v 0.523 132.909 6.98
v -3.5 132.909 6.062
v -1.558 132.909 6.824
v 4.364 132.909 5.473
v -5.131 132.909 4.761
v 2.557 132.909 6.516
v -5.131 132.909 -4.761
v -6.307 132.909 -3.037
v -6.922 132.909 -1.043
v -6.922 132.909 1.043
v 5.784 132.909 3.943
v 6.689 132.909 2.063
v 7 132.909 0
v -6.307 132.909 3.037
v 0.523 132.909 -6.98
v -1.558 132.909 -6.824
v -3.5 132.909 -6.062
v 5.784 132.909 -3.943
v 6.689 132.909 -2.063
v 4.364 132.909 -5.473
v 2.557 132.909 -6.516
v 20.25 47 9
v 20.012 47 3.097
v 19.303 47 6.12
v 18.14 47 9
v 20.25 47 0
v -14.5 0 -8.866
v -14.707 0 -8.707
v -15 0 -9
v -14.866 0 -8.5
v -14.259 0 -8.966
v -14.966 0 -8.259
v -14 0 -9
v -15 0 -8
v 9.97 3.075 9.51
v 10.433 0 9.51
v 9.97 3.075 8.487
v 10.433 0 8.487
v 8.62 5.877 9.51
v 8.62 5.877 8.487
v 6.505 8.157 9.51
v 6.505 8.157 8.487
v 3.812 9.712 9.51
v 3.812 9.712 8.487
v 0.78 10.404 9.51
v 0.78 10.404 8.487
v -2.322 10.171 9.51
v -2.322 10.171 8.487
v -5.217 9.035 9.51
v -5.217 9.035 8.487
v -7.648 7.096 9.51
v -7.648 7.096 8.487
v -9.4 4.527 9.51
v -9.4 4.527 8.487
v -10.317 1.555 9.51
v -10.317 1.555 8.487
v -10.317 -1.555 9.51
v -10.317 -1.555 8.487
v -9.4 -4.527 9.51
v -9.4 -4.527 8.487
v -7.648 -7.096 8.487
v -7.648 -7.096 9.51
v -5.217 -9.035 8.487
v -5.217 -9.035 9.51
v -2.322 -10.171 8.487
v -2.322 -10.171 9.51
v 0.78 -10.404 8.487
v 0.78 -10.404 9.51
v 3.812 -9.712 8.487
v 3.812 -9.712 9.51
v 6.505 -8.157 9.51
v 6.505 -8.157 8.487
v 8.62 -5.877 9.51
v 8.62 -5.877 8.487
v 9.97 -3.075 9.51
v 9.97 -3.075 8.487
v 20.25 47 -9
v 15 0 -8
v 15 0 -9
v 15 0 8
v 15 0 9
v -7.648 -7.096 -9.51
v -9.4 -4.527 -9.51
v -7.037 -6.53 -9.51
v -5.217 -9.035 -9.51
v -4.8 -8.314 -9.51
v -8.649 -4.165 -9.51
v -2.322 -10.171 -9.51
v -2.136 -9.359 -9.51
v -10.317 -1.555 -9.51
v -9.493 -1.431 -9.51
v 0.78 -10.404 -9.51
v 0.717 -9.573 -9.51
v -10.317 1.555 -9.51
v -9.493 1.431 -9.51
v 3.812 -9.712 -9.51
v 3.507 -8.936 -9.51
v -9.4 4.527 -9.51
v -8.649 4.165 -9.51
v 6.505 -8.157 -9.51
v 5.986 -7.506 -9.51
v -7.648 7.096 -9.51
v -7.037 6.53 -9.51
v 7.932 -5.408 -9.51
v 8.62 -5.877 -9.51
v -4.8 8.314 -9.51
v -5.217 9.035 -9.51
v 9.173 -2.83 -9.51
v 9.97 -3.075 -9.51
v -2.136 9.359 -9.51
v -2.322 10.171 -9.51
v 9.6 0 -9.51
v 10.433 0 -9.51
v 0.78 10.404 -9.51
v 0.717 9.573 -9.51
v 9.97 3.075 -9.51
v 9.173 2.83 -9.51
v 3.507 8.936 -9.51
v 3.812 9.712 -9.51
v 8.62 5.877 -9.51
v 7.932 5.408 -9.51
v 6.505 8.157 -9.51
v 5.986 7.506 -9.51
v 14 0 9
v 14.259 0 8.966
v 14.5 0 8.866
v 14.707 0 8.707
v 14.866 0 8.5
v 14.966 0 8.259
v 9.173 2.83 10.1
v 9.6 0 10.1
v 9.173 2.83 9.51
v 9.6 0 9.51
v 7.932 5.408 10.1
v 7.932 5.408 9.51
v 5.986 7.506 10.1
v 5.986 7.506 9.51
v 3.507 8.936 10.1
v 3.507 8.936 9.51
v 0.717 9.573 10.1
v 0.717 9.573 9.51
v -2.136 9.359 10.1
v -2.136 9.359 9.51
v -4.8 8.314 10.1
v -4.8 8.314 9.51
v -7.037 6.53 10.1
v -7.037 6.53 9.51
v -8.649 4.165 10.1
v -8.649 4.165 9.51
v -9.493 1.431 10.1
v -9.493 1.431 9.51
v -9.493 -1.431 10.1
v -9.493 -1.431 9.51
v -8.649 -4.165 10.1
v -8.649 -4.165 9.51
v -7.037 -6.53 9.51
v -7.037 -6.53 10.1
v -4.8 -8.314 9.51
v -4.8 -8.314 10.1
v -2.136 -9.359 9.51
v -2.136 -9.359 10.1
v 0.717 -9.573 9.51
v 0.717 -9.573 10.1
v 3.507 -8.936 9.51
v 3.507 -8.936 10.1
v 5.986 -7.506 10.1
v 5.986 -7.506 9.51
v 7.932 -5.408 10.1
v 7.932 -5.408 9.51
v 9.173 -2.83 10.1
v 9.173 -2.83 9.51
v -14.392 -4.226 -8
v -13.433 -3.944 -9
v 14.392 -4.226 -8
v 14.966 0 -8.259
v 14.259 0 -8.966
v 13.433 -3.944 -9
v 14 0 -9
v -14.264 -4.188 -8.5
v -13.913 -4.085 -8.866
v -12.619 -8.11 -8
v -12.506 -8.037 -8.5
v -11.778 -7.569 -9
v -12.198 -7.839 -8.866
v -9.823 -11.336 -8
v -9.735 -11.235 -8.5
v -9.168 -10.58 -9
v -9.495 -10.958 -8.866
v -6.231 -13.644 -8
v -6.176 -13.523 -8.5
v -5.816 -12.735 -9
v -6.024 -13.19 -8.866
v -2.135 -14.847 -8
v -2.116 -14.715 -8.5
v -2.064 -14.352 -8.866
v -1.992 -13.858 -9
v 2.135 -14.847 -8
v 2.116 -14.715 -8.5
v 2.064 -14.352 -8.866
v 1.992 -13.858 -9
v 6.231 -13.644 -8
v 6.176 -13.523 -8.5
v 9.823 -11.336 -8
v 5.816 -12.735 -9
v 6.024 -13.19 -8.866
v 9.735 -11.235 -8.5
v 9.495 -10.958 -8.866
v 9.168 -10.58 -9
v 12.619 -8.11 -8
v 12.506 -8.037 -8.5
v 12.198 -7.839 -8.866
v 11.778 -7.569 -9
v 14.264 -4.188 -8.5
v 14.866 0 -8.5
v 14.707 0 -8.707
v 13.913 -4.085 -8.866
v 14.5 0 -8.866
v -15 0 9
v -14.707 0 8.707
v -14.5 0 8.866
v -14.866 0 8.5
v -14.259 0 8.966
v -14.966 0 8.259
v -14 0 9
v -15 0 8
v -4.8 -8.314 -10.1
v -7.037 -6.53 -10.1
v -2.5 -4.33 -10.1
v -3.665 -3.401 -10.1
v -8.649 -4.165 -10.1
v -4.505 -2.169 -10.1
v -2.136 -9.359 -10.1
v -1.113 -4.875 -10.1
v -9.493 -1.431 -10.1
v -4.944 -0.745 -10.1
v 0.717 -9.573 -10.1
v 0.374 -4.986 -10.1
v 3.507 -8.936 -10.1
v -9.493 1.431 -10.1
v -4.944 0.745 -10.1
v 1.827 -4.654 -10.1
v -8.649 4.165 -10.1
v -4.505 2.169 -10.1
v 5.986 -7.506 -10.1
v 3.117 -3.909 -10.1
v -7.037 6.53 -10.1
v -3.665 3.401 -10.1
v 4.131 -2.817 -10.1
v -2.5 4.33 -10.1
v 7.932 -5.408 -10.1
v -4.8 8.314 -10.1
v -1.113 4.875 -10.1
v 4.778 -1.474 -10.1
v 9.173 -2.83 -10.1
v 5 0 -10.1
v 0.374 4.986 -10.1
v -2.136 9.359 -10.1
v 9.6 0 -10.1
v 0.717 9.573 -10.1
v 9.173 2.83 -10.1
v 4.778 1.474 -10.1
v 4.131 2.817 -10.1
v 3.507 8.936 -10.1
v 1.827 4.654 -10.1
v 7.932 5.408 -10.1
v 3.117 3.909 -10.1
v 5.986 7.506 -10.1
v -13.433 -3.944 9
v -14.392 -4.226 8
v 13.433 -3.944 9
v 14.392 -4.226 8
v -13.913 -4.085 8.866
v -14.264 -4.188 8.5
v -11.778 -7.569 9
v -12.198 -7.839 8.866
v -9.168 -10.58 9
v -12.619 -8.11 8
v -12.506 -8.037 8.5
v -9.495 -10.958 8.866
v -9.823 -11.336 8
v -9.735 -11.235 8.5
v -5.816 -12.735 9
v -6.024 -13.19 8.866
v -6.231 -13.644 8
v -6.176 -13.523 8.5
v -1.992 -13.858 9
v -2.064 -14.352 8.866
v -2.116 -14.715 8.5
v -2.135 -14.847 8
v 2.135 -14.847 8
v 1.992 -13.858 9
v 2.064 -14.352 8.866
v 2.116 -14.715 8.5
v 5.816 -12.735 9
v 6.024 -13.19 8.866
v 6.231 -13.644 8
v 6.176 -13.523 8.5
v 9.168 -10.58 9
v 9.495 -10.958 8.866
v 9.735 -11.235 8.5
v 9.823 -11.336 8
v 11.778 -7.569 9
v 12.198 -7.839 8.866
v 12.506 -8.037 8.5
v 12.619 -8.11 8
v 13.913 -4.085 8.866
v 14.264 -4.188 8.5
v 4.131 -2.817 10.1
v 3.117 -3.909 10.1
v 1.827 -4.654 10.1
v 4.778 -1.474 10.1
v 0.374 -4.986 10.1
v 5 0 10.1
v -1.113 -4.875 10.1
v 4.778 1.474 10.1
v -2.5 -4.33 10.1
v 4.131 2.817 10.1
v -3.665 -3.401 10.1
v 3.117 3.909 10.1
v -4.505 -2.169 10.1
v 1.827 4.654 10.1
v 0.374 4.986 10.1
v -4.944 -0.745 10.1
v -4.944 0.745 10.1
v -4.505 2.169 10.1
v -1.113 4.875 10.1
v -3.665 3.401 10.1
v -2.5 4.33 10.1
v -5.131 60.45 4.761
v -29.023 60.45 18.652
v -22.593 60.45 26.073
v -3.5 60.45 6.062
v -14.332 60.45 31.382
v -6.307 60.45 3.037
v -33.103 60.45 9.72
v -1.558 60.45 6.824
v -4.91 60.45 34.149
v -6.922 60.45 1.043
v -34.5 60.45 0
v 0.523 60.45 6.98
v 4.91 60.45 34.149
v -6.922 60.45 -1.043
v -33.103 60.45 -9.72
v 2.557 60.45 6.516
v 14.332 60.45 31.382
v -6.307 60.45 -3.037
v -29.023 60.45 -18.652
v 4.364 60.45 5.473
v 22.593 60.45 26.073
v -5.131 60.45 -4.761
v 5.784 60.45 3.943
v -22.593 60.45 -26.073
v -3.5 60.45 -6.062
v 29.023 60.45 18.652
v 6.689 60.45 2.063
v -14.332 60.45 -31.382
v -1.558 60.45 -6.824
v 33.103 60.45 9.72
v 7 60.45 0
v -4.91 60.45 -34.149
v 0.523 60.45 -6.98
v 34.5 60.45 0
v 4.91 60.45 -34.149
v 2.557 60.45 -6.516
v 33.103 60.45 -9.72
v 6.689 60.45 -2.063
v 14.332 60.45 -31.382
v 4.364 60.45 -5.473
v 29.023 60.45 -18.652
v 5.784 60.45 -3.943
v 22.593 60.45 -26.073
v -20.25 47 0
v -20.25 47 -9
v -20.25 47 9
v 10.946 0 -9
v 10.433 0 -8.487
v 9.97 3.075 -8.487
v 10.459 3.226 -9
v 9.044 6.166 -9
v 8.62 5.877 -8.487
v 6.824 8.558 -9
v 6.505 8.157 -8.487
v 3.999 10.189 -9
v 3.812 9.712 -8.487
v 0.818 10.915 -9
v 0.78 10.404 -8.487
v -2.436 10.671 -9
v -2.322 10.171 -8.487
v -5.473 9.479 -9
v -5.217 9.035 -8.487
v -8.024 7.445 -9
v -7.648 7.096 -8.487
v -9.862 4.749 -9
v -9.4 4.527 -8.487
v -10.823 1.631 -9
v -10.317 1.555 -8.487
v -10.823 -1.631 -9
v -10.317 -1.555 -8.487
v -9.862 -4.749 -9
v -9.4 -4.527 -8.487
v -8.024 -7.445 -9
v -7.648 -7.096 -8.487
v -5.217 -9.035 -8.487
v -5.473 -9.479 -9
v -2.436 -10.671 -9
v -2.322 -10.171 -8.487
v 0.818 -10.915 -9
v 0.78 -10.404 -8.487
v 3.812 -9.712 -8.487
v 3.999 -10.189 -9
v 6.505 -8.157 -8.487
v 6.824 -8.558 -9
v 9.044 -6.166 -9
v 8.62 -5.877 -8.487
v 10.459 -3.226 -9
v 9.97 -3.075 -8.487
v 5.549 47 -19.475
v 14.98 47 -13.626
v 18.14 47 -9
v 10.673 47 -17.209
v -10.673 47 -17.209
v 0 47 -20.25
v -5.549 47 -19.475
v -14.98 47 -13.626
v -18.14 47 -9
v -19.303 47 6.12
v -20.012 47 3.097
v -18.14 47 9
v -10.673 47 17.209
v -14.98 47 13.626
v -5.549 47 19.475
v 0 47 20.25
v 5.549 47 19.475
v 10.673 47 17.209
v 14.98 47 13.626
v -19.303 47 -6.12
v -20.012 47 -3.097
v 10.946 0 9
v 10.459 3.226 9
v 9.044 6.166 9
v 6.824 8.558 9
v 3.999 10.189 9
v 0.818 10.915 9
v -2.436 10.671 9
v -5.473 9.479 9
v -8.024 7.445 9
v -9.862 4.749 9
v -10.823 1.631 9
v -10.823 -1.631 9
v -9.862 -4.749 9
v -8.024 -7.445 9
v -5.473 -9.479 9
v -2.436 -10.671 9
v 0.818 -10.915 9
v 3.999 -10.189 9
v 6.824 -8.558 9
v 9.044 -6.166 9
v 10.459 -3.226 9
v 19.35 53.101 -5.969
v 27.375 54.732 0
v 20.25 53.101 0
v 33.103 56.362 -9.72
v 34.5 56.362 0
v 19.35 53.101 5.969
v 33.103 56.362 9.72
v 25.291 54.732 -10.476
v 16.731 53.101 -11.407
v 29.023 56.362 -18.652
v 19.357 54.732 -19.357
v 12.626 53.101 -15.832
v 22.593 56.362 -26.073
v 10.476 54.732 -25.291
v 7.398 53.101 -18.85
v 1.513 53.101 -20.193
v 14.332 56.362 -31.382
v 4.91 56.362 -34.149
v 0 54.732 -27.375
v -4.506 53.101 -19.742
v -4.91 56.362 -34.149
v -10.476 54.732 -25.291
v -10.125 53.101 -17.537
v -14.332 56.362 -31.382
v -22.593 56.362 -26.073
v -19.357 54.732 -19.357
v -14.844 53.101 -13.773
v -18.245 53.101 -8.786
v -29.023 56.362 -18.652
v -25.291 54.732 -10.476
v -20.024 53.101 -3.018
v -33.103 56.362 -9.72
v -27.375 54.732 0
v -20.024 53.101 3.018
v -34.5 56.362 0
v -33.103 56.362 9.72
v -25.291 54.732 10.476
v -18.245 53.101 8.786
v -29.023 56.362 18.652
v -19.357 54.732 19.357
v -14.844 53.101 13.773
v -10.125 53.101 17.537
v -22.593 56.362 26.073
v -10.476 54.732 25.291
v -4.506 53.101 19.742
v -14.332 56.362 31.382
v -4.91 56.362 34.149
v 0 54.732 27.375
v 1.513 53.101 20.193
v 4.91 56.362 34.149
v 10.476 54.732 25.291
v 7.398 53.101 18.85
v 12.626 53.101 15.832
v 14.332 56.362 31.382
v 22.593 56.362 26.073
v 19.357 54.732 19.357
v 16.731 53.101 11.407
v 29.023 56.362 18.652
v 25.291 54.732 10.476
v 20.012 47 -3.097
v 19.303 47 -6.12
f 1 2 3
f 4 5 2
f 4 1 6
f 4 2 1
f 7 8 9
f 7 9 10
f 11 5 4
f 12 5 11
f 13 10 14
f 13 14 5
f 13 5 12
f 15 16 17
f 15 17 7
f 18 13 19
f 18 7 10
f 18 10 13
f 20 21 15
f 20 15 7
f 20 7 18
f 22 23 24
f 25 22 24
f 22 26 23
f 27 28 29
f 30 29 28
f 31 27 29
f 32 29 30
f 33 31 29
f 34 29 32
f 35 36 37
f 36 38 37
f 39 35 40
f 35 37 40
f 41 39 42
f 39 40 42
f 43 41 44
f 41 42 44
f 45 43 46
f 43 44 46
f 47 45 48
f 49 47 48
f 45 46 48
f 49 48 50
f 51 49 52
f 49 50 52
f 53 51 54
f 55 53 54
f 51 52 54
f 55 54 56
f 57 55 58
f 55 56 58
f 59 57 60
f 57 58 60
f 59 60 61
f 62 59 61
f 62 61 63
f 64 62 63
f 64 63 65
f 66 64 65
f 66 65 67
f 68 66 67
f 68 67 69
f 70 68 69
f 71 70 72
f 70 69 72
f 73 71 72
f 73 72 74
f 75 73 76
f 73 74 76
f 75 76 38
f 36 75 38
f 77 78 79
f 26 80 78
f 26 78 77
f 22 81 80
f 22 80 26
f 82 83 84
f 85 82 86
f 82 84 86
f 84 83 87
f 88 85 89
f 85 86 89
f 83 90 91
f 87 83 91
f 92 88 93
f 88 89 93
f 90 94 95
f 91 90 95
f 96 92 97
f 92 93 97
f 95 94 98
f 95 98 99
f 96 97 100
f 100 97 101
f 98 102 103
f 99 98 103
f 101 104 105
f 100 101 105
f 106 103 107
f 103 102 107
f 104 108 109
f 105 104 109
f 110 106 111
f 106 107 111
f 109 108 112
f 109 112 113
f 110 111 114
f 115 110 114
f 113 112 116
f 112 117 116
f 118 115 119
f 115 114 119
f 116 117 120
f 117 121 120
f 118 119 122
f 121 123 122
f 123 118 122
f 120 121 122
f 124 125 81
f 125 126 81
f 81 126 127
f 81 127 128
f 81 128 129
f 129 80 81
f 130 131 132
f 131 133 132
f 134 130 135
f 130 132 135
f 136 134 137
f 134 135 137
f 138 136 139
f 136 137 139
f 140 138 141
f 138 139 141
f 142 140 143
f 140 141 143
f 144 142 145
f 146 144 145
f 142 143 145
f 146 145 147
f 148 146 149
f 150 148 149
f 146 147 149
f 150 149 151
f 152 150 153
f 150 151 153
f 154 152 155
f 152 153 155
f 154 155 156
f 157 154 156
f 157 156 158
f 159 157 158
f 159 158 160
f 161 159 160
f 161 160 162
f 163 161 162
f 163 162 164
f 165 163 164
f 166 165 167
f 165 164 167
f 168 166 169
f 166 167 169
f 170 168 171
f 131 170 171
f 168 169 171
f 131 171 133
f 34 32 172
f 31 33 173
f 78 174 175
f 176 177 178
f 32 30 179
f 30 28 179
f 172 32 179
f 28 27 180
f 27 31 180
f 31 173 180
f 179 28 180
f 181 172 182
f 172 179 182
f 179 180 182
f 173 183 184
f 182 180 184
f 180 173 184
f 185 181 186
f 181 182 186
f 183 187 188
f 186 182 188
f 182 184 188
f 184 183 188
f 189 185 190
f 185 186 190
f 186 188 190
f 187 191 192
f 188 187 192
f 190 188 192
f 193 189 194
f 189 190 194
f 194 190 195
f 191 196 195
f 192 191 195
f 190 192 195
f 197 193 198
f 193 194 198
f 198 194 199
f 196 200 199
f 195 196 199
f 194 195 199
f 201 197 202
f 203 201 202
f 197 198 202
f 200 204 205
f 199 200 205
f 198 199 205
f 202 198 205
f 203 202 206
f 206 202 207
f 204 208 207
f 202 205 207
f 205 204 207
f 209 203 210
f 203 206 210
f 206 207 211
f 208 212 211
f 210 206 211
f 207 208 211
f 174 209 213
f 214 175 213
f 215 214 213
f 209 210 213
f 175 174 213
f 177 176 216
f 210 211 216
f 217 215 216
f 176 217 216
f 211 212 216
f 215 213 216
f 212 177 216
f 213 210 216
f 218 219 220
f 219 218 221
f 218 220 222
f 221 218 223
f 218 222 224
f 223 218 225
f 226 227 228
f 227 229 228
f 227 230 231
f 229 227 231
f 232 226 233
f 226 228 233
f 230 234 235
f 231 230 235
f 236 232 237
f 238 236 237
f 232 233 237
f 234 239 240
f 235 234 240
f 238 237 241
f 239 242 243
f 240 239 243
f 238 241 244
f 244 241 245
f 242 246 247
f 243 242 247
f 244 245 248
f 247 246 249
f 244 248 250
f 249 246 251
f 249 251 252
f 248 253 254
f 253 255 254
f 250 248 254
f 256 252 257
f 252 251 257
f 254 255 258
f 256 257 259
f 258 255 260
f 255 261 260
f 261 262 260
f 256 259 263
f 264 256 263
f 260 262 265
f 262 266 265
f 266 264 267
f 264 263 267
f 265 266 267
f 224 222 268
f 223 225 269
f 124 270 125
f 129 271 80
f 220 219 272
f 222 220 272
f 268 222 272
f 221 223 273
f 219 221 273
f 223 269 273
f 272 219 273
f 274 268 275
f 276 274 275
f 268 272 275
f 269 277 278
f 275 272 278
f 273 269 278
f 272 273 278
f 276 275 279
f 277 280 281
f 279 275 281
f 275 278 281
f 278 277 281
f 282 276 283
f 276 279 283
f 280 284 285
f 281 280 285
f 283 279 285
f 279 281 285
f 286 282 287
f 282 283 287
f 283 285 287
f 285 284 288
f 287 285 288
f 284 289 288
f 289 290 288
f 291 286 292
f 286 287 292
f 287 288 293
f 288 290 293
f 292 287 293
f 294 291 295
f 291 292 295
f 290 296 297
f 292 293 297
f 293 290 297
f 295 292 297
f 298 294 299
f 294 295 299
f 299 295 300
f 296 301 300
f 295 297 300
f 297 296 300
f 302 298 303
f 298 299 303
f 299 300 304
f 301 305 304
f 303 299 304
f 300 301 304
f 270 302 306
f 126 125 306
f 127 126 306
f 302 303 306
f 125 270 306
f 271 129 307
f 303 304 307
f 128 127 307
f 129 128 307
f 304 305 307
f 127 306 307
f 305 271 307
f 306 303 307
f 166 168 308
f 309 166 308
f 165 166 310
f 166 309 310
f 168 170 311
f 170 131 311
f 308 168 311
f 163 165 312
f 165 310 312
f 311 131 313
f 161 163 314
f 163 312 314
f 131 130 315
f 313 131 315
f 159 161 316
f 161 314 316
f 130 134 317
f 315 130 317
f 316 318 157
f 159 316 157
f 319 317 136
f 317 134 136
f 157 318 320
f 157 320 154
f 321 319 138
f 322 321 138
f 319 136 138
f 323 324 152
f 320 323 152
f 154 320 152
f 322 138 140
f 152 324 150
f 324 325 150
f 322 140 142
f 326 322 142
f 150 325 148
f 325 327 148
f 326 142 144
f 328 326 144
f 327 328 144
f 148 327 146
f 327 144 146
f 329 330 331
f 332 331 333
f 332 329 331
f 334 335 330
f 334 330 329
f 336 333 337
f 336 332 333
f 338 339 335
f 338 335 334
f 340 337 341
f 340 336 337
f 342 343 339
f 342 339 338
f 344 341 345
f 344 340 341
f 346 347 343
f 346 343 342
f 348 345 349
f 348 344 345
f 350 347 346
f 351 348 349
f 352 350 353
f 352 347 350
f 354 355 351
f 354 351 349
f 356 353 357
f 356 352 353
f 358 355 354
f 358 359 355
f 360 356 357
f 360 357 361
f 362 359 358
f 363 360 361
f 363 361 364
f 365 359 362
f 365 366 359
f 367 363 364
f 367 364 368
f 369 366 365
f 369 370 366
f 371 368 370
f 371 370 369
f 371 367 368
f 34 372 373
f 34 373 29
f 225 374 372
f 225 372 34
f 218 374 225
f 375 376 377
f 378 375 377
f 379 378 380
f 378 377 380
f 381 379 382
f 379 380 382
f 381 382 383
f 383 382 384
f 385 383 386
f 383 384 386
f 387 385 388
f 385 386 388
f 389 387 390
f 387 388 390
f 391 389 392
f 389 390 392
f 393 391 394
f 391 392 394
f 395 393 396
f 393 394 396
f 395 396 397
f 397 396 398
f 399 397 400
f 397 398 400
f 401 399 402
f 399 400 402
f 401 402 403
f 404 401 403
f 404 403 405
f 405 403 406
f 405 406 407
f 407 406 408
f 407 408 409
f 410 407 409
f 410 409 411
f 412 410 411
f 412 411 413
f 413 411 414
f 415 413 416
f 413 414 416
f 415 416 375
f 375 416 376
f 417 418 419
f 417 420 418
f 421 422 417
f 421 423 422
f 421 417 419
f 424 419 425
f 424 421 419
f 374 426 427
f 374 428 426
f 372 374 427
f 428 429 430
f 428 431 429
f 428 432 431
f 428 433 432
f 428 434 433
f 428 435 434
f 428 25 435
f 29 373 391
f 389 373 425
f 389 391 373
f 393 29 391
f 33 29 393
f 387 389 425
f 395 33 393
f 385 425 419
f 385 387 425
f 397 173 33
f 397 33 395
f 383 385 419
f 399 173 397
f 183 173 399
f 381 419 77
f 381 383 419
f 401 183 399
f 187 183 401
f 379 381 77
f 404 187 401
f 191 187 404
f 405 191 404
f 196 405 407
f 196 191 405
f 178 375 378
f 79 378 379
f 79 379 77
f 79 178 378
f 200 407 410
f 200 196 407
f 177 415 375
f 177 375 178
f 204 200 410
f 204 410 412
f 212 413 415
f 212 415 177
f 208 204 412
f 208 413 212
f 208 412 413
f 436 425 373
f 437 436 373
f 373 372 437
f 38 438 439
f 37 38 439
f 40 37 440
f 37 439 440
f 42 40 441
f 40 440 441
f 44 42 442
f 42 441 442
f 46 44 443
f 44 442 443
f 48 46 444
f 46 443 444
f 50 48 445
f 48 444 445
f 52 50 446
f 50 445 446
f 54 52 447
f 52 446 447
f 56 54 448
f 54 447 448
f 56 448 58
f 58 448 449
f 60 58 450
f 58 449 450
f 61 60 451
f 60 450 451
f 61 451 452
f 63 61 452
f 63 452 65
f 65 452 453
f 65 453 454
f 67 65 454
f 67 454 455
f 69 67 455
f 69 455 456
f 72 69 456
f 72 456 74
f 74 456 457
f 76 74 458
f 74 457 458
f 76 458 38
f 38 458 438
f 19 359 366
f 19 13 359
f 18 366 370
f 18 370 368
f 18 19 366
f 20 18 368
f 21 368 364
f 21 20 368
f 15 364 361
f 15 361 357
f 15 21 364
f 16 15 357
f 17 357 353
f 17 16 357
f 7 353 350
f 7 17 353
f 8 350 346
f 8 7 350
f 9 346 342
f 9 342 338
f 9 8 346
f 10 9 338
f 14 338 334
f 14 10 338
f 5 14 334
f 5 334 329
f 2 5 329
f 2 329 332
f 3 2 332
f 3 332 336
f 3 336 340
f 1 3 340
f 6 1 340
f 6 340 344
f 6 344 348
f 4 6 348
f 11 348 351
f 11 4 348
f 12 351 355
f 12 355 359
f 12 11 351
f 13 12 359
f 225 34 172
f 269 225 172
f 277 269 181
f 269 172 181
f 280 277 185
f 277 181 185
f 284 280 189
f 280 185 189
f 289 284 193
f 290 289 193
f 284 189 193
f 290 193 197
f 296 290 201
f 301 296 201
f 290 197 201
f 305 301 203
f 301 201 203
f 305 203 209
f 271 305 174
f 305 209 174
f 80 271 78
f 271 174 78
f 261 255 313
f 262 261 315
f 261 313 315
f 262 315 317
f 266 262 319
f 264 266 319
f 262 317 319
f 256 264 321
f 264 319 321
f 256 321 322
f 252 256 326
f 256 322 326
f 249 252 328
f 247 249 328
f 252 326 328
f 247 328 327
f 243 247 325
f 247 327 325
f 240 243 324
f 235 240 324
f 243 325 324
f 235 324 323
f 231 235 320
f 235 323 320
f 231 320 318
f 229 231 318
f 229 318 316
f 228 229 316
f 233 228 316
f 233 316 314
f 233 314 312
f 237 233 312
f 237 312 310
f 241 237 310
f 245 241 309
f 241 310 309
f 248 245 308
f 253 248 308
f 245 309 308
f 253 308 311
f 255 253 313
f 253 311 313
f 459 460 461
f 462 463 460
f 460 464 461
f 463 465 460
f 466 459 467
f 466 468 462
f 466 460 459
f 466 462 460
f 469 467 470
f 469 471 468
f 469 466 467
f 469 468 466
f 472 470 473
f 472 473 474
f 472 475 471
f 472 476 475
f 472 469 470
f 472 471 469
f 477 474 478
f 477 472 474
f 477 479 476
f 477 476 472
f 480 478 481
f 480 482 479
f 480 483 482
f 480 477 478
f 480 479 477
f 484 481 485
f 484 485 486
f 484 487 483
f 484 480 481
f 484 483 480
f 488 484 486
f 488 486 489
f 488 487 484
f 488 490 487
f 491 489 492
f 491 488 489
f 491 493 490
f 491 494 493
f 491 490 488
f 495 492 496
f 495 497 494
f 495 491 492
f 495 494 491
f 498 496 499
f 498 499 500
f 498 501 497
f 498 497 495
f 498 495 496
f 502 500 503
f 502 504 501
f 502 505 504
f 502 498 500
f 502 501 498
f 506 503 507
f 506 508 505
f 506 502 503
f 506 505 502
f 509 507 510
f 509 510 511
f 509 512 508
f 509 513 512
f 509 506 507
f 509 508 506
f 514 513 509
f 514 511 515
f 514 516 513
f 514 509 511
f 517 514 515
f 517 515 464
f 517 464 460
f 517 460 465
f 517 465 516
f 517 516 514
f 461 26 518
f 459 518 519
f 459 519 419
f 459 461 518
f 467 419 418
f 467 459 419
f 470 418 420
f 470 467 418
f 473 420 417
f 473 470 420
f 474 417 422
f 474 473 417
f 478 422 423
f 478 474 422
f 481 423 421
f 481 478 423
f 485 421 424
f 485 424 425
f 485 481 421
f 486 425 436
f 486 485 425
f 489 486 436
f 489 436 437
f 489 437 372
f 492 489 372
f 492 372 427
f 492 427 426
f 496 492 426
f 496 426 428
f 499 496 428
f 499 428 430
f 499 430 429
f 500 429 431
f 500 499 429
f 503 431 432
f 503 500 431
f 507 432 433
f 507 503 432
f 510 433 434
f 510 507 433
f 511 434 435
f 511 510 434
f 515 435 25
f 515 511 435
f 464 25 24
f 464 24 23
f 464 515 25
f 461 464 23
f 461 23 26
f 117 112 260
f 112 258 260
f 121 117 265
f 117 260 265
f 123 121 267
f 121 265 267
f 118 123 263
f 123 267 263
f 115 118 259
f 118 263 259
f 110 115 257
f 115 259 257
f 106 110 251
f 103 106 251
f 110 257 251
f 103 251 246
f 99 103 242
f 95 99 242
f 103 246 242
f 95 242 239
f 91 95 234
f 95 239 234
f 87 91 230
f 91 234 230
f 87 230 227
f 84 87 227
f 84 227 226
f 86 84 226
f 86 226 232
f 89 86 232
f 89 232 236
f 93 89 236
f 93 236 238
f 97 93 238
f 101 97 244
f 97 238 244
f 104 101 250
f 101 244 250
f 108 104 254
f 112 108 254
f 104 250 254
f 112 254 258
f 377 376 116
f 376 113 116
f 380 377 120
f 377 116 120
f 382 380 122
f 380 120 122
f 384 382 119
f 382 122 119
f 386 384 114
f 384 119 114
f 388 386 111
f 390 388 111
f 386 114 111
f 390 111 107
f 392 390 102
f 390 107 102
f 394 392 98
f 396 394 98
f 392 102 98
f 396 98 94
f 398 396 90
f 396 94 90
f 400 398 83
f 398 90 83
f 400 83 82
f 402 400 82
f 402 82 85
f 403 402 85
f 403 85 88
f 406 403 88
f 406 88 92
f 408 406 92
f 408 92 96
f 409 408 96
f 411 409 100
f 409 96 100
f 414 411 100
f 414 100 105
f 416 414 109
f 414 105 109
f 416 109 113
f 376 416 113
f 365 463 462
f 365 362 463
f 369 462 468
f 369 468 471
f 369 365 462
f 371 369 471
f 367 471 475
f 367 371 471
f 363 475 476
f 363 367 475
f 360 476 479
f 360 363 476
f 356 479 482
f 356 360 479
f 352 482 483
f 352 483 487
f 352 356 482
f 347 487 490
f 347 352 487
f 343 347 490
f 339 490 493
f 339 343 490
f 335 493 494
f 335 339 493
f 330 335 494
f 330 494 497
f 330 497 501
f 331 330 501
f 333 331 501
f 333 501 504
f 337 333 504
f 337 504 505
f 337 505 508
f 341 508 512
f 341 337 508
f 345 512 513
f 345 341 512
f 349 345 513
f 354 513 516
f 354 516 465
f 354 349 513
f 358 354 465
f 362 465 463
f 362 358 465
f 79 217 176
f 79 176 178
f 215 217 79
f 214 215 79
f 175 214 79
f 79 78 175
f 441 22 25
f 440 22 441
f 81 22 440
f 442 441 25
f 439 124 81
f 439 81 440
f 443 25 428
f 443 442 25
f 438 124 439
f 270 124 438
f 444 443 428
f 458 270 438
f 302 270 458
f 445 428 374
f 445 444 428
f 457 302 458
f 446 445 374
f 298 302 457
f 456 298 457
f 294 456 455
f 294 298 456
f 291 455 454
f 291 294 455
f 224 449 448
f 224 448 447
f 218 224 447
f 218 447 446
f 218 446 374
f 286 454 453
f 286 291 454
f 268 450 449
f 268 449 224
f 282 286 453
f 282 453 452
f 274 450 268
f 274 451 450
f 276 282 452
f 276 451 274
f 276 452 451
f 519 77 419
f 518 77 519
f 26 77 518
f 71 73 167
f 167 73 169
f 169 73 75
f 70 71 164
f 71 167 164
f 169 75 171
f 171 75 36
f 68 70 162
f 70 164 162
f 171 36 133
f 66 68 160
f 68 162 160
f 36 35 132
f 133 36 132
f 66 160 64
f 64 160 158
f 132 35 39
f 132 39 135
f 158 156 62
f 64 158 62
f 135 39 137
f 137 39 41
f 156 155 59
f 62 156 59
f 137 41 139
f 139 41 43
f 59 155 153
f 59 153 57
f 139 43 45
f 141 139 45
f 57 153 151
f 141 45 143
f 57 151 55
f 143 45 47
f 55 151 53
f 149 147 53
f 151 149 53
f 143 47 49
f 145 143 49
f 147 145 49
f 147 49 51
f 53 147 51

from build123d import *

# Parameters (mm, degrees)
EXTRUDE1_REACH             = 12.1
EXTRUDE1_DIRECTION_2_REACH = 12.1


with BuildPart() as part:
    # Sketch2 → Revolve1 (revolve)
    with BuildSketch(Plane(origin=(0, 0, 0), x_dir=(1, 0, 0), z_dir=(0, 1, 0))):
        with BuildLine():
            Line((5, 10.1), (5, -10.1))
            Line((5, -10.1), (9.6, -10.1))
            Line((9.6, -10.1), (9.6, -9.510239904))
            Line((9.6, -9.510239904), (10.433077185, -9.510239904))
            Line((10.433077185, -9.510239904), (10.433077185, -8.48743323))
            Line((10.433077185, -8.48743323), (10.945643955, -9))
            Line((10.945643955, -9), (14, -9))
            ThreePointArc((14, -9), (14.707106781, -8.707106781), (15, -8))
            Line((15, -8), (15, 8))
            ThreePointArc((15, 8), (14.707106781, 8.707106781), (14, 9))
            Line((14, 9), (10.945643955, 9))
            Line((10.945643955, 9), (10.433077185, 8.48743323))
            Line((10.433077185, 8.48743323), (10.433077185, 9.510239904))
            Line((10.433077185, 9.510239904), (9.6, 9.510239904))
            Line((9.6, 9.510239904), (9.6, 10.1))
            Line((9.6, 10.1), (5, 10.1))
        make_face()
    revolve(axis=Axis((0, 0, -9.945393457), (0, 0, 1)))

    # Extrude1: up to this face of the body (flat: up to its plane)
    extrude1_end = Plane(part.part.faces().sort_by_distance((-11.341623752, 0, 9))[0])
    # Sketch3 → Extrude1 (add, up to the picked face)
    with BuildSketch(Plane.XY, mode=Mode.PRIVATE) as extrude1_sk1:
        with BuildLine():
            Line((-20.25, 47), (-15, 0))
            Line((-15, 0), (-10.945643955, 0))
            ThreePointArc((-10.945643955, 0), (0, 10.945643955), (10.945643955, 0))
            Line((10.945643955, 0), (15, 0))
            Line((15, 0), (20.25, 47))
            Line((20.25, 47), (-20.25, 47))
        make_face()
    extrude1_tool1 = split(extrude(extrude1_sk1.sketch, amount=EXTRUDE1_REACH, mode=Mode.PRIVATE), bisect_by=extrude1_end, keep=Keep.BOTH, mode=Mode.PRIVATE)
    add(extrude1_tool1.solids().sort_by_distance((0, 27.232341, 0))[0])

    # Extrude1 direction 2: up to this face of the body (flat: up to its plane)
    extrude1_direction_2_end = Plane(part.part.faces().sort_by_distance((-13.604020203, 0, -9))[0])
    # Sketch3 → Extrude1 direction 2 (add, up to the picked face)
    with BuildSketch(Plane.XY, mode=Mode.PRIVATE) as extrude1_direction_2_sk1:
        with BuildLine():
            Line((-20.25, 47), (-15, 0))
            Line((-15, 0), (-10.945643955, 0))
            ThreePointArc((-10.945643955, 0), (0, 10.945643955), (10.945643955, 0))
            Line((10.945643955, 0), (15, 0))
            Line((15, 0), (20.25, 47))
            Line((20.25, 47), (-20.25, 47))
        make_face()
    extrude1_direction_2_tool1 = split(extrude(extrude1_direction_2_sk1.sketch, amount=-EXTRUDE1_DIRECTION_2_REACH, mode=Mode.PRIVATE), bisect_by=extrude1_direction_2_end, keep=Keep.BOTH, mode=Mode.PRIVATE)
    add(extrude1_direction_2_tool1.solids().sort_by_distance((0, 27.232341, 0))[0])

    # Sketch7 → Revolve2 (revolve)
    with BuildSketch(Plane.XY):
        Polygon((0, 47), (20.25, 47), (20.25, 53.100825313), (34.5, 56.36235646), (34.5, 60.45), (7, 60.45), (7, 132.908961398), (0, 132.908961398), align=None)
    revolve(axis=Axis((0, 0, 0), (0, 1, 0)))


solid = part.part
